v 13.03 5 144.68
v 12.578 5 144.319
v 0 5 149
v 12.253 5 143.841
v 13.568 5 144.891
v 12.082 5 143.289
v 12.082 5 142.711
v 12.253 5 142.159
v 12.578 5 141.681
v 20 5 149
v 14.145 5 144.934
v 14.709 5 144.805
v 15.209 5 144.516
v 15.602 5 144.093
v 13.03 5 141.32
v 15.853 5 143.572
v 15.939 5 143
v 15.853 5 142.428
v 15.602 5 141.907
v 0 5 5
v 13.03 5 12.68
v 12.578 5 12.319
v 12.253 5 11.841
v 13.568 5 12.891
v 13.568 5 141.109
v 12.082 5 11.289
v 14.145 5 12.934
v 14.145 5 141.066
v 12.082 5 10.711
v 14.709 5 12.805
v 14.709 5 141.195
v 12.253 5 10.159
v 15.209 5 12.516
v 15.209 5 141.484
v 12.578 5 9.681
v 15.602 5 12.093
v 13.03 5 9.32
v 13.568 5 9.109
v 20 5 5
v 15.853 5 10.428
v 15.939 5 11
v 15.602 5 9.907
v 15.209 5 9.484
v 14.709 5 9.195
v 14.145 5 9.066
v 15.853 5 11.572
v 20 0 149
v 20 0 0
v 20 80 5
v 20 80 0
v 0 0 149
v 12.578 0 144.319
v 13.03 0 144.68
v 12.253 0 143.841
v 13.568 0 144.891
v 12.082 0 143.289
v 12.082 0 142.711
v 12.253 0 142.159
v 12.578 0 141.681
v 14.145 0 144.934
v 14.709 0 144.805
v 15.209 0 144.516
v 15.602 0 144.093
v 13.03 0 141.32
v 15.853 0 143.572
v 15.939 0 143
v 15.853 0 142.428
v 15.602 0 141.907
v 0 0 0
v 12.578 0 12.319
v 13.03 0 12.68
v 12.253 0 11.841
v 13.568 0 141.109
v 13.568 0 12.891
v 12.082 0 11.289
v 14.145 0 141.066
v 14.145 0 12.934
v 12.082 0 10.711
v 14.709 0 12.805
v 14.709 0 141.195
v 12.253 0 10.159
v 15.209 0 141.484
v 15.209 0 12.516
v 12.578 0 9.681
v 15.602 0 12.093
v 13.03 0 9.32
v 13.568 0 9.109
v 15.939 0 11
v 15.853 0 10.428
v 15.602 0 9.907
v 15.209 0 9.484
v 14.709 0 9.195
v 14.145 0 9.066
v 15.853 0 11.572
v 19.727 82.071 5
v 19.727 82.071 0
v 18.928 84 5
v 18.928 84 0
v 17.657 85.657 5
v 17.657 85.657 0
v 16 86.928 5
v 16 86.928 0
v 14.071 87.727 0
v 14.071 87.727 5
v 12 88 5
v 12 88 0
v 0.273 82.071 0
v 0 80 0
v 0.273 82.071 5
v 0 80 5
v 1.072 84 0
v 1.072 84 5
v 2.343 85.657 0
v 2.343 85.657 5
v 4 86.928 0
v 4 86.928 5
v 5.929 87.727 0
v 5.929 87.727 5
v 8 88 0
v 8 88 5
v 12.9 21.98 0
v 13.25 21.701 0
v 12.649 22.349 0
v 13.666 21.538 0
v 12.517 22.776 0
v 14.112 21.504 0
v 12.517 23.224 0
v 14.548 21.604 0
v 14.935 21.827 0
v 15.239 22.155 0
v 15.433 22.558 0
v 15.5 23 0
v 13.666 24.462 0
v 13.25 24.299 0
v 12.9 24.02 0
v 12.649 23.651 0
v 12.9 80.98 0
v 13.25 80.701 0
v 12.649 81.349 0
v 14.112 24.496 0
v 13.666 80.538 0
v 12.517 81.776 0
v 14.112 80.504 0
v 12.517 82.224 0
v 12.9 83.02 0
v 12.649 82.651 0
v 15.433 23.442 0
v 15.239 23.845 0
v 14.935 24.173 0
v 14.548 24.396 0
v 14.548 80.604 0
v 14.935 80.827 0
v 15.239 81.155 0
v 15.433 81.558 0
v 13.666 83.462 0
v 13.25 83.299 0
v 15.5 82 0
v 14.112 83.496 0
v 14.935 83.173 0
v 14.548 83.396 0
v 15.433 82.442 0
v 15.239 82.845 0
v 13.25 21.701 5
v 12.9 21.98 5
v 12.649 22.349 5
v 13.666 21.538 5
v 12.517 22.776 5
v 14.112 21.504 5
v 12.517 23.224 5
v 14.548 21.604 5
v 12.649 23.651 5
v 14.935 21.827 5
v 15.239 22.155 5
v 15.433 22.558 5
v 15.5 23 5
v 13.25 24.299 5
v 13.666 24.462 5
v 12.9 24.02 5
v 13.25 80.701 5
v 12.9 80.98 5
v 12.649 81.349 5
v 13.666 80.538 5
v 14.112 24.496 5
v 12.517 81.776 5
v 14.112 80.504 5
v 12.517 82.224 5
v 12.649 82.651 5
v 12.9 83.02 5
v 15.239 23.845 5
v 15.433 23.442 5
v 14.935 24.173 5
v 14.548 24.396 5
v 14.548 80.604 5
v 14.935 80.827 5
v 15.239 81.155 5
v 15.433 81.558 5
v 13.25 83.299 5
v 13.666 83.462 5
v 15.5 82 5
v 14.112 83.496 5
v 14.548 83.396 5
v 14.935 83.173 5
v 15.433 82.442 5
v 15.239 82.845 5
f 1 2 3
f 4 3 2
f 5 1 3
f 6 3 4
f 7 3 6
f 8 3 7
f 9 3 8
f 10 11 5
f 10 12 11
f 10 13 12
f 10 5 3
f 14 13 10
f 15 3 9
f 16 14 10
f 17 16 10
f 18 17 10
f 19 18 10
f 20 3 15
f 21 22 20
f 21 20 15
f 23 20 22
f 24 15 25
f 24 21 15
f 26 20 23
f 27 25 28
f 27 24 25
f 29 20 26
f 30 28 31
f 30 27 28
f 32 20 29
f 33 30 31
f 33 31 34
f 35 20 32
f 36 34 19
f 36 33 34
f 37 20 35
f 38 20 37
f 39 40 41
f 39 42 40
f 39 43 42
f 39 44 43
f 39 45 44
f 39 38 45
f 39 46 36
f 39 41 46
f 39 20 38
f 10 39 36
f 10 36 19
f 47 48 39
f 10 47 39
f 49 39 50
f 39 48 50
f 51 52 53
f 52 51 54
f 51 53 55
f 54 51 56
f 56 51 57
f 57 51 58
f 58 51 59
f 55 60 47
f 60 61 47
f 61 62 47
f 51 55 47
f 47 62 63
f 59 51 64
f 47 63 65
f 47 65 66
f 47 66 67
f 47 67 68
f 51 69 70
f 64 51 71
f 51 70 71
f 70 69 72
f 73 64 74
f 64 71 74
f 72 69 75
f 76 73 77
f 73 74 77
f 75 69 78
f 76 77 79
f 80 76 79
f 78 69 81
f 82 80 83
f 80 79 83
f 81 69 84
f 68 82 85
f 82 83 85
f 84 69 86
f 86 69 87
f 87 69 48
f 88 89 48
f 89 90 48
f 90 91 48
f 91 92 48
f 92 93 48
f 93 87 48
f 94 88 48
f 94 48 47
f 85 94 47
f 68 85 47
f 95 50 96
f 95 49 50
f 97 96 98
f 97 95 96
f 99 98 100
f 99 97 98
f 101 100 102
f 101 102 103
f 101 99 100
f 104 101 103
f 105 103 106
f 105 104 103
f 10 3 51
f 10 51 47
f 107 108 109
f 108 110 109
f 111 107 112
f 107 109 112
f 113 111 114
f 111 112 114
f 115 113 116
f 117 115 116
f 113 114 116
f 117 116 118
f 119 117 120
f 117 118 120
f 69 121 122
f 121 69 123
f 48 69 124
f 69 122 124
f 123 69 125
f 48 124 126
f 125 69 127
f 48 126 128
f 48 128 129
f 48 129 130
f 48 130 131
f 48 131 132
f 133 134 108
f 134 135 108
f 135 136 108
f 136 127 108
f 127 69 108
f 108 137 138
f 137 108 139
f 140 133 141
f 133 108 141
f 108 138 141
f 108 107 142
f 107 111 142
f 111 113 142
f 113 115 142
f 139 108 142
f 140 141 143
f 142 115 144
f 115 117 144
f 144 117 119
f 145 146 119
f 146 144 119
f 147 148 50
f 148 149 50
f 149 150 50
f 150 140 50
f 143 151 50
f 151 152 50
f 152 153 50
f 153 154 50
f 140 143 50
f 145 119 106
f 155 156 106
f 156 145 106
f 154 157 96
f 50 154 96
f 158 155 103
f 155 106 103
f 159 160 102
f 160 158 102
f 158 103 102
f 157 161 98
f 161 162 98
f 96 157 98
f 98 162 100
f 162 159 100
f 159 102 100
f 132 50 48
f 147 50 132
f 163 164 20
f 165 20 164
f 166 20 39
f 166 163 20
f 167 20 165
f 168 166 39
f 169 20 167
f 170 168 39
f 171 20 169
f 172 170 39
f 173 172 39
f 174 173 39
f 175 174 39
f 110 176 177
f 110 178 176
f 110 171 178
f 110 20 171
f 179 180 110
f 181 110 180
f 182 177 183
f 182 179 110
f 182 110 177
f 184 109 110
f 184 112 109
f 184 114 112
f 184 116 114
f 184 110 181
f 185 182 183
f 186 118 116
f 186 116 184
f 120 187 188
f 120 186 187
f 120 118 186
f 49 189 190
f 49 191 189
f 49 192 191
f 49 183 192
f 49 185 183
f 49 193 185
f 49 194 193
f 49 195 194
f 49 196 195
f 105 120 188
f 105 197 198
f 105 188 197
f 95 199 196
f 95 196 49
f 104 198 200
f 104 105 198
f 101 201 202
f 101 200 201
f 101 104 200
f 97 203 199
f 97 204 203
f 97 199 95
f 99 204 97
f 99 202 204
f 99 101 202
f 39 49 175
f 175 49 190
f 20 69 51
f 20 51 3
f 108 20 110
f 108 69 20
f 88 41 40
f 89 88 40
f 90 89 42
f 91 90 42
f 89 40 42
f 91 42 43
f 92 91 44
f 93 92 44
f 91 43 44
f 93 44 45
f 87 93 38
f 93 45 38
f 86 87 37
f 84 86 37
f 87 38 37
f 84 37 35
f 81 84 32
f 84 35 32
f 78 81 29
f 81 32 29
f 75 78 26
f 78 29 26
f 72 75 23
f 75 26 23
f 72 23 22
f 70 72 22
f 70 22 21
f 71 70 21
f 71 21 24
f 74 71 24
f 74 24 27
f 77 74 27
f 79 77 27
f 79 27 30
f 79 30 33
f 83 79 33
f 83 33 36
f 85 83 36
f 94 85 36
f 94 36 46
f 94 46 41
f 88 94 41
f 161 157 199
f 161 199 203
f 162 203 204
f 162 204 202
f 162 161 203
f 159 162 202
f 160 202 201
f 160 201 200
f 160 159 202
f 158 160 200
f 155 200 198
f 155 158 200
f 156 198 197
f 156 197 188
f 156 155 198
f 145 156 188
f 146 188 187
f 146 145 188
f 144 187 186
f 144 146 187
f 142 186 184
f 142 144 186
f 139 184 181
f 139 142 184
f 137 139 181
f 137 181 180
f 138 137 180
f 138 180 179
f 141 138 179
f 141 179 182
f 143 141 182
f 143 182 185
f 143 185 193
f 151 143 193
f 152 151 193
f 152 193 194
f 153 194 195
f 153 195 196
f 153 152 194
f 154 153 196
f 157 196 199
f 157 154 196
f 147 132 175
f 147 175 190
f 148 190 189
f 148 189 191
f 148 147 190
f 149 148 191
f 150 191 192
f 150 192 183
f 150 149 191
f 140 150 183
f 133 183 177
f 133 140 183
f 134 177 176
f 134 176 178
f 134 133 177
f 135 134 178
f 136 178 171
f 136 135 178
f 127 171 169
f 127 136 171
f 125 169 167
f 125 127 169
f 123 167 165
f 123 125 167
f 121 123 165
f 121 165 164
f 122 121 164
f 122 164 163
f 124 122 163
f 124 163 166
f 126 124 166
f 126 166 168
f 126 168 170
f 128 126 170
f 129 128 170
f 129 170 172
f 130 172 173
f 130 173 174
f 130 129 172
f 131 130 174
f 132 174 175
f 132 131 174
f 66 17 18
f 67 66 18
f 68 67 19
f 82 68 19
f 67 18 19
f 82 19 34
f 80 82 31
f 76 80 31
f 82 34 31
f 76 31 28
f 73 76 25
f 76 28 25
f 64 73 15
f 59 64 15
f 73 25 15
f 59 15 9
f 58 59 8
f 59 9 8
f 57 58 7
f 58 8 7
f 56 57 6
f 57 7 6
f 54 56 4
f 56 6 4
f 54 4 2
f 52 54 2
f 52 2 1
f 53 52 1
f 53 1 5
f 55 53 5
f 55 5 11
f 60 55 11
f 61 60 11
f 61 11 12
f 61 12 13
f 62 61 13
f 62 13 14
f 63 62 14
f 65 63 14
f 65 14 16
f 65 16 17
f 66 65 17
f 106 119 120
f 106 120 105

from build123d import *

# Parameters (mm, degrees)
SKETCH1_W           = 20
SKETCH1_H           = 88
SKETCH1_R           = 1.5
BOSS_EXTRUDE1_DEPTH = 5
SKETCH2_W           = 20
SKETCH2_H           = 5
BOSS_EXTRUDE2_DEPTH = 144
FILLET1_R           = 8
SKETCH3_R           = 1.939400698
CUT_EXTRUDE1_DEPTH  = 6


with BuildPart() as part:
    # Sketch1 → Boss-Extrude1 (new body)
    with BuildSketch(Plane.XY):
        with Locations((10, 44)):
            Rectangle(SKETCH1_W, SKETCH1_H)
        with Locations((14, 82)):
            Circle(SKETCH1_R, mode=Mode.SUBTRACT)
        with Locations((14, 23)):
            Circle(SKETCH1_R, mode=Mode.SUBTRACT)
    extrude(amount=BOSS_EXTRUDE1_DEPTH)

    # Sketch2 → Boss-Extrude2 (add)
    with BuildSketch(Plane.XY.offset(5)):
        with Locations((10, 2.5)):
            Rectangle(SKETCH2_W, SKETCH2_H)
    extrude(amount=BOSS_EXTRUDE2_DEPTH)

    # Fillet1
    fillet1_edges = [part.edges().sort_by_distance(p)[0] for p in [
        (20, 88, 2.5),
        (0, 88, 2.5),
    ]]
    fillet(fillet1_edges, radius=FILLET1_R)

    # Sketch3 → Cut-Extrude1 (cut, through all)
    with BuildSketch(Plane(origin=(0, 5, 0), x_dir=(1, 0, 0), z_dir=(0, 1, 0))):
        with Locations((14, -143)):
            Circle(SKETCH3_R)
        with Locations((14, -11)):
            Circle(SKETCH3_R)
    extrude(amount=-CUT_EXTRUDE1_DEPTH, mode=Mode.SUBTRACT)


solid = part.part
